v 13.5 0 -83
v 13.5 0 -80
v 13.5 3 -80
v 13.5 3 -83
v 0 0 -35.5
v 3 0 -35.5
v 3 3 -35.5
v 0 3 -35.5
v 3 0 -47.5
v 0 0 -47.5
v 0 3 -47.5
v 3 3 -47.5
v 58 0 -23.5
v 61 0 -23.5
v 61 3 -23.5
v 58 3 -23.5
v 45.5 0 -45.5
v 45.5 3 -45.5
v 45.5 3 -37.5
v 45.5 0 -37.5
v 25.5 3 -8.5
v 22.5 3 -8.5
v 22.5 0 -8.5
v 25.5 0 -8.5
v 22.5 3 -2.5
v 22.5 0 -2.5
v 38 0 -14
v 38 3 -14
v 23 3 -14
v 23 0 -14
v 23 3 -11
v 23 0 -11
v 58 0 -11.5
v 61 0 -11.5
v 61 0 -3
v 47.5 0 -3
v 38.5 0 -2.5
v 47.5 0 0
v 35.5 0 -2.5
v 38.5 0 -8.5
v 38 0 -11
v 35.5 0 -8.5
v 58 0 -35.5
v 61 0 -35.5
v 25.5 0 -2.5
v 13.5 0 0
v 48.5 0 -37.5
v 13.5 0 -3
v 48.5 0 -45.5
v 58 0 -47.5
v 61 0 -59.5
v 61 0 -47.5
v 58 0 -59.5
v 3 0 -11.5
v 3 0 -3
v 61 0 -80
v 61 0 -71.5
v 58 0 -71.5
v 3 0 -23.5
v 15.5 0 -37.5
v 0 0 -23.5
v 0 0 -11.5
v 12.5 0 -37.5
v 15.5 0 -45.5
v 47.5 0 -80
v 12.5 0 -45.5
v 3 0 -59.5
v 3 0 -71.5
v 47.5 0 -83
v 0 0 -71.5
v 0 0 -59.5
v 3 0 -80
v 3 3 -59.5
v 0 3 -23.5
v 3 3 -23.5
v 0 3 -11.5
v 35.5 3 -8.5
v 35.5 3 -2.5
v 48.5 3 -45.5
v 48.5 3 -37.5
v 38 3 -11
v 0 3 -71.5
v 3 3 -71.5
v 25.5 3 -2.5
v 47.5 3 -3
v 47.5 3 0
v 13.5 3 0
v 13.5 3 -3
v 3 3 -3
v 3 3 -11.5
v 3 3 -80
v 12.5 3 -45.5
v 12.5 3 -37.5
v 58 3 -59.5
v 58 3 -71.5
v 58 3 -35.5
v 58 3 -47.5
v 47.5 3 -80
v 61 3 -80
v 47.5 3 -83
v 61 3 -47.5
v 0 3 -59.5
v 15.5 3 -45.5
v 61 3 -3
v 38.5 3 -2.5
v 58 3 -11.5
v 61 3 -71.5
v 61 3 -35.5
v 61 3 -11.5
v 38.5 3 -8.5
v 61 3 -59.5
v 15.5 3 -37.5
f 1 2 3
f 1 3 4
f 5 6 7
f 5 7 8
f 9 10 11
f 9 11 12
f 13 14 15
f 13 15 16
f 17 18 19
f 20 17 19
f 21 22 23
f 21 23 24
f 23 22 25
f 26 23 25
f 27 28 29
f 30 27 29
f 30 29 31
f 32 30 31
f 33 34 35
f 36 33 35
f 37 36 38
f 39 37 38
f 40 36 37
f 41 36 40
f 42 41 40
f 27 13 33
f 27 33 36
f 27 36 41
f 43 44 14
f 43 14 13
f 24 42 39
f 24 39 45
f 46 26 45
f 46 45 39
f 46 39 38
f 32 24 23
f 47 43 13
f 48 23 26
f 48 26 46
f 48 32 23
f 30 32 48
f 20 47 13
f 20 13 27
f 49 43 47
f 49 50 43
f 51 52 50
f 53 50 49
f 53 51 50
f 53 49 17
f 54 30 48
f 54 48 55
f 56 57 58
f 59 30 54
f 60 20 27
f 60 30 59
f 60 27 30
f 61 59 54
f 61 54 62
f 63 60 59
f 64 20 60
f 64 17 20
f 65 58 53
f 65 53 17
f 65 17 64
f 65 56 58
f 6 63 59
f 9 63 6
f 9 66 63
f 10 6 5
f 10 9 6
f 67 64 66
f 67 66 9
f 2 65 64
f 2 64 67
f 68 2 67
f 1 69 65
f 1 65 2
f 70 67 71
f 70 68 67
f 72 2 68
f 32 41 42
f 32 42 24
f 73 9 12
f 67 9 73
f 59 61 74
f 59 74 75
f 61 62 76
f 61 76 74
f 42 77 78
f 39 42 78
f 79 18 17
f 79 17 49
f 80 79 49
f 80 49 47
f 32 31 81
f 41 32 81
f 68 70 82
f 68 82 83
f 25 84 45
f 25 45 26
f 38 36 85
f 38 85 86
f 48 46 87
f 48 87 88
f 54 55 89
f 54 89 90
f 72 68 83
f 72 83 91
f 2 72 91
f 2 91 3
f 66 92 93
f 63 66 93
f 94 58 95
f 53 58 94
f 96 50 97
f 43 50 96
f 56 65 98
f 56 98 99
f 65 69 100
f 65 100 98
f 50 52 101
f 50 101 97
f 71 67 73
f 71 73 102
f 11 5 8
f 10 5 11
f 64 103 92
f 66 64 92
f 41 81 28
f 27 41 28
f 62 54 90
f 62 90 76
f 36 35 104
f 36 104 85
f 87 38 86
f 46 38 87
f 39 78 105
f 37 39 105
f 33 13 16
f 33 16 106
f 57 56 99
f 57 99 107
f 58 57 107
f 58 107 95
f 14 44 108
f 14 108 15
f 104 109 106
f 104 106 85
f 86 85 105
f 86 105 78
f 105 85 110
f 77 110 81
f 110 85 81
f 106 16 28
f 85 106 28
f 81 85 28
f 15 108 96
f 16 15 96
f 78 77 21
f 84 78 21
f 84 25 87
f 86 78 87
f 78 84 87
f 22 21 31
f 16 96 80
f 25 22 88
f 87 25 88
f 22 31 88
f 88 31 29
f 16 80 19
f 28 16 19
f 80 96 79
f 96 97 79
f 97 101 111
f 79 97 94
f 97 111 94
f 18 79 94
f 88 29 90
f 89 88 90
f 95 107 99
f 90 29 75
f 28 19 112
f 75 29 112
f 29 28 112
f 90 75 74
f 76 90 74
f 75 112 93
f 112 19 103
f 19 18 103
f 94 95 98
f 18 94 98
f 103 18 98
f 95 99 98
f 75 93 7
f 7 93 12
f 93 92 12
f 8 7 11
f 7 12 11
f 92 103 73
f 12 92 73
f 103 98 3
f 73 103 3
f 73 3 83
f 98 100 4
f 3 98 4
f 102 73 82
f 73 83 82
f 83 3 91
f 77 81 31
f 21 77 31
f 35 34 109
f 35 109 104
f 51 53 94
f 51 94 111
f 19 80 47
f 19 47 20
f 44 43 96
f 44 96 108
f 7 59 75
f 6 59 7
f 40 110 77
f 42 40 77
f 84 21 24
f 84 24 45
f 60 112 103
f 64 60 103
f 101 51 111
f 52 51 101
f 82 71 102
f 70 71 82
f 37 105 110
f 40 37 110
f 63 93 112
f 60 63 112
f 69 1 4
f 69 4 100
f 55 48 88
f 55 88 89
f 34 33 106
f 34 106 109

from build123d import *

# Parameters (mm, degrees)
SALIENTE_EXTRUIR1_DEPTH = 3
CORTAR_EXTRUIR1_DEPTH   = 10


with BuildPart() as part:
    # Croquis1 → Saliente-Extruir1 (new body)
    with BuildSketch(Plane(origin=(0, 0, 0), x_dir=(1, 0, 0), z_dir=(0, 1, 0))):
        Polygon((3, 35.5), (0, 35.5), (0, 47.5), (3, 47.5), (3, 59.5), (0, 59.5), (0, 71.5), (3, 71.5), (3, 80), (13.5, 80), (13.5, 83), (47.5, 83), (47.5, 80), (61, 80), (61, 71.5), (58, 71.5), (58, 59.5), (61, 59.5), (61, 47.5), (58, 47.5), (58, 35.5), (61, 35.5), (61, 23.5), (58, 23.5), (58, 11.5), (61, 11.5), (61, 3), (47.5, 3), (47.5, 0), (13.5, 0), (13.5, 3), (3, 3), (3, 11.5), (0, 11.5), (0, 23.5), (3, 23.5), align=None)
    extrude(amount=SALIENTE_EXTRUIR1_DEPTH)

    # Croquis2 → Cortar-Extruir1 (cut)
    with BuildSketch(Plane(origin=(0, 3, 0), x_dir=(1, 0, 0), z_dir=(0, 1, 0))):
        Polygon((15.5, 41.5), (15.5, 45.5), (12.5, 45.5), (12.5, 37.5), (15.5, 37.5), align=None)
        Polygon((45.5, 37.5), (45.5, 41.5), (45.5, 45.5), (48.5, 45.5), (48.5, 37.5), align=None)
        Polygon((30.5, 14), (23, 14), (23, 11), (25, 11), (38, 11), (38, 14), align=None)
        Polygon((35.5, 8.5), (35.5, 2.5), (38.5, 2.5), (38.5, 5.5), (38.5, 8.5), align=None)
        Polygon((22.5, 5.5), (22.5, 8.5), (25.5, 8.5), (25.5, 2.5), (22.5, 2.5), align=None)
    extrude(amount=-CORTAR_EXTRUIR1_DEPTH, mode=Mode.SUBTRACT)


solid = part.part
